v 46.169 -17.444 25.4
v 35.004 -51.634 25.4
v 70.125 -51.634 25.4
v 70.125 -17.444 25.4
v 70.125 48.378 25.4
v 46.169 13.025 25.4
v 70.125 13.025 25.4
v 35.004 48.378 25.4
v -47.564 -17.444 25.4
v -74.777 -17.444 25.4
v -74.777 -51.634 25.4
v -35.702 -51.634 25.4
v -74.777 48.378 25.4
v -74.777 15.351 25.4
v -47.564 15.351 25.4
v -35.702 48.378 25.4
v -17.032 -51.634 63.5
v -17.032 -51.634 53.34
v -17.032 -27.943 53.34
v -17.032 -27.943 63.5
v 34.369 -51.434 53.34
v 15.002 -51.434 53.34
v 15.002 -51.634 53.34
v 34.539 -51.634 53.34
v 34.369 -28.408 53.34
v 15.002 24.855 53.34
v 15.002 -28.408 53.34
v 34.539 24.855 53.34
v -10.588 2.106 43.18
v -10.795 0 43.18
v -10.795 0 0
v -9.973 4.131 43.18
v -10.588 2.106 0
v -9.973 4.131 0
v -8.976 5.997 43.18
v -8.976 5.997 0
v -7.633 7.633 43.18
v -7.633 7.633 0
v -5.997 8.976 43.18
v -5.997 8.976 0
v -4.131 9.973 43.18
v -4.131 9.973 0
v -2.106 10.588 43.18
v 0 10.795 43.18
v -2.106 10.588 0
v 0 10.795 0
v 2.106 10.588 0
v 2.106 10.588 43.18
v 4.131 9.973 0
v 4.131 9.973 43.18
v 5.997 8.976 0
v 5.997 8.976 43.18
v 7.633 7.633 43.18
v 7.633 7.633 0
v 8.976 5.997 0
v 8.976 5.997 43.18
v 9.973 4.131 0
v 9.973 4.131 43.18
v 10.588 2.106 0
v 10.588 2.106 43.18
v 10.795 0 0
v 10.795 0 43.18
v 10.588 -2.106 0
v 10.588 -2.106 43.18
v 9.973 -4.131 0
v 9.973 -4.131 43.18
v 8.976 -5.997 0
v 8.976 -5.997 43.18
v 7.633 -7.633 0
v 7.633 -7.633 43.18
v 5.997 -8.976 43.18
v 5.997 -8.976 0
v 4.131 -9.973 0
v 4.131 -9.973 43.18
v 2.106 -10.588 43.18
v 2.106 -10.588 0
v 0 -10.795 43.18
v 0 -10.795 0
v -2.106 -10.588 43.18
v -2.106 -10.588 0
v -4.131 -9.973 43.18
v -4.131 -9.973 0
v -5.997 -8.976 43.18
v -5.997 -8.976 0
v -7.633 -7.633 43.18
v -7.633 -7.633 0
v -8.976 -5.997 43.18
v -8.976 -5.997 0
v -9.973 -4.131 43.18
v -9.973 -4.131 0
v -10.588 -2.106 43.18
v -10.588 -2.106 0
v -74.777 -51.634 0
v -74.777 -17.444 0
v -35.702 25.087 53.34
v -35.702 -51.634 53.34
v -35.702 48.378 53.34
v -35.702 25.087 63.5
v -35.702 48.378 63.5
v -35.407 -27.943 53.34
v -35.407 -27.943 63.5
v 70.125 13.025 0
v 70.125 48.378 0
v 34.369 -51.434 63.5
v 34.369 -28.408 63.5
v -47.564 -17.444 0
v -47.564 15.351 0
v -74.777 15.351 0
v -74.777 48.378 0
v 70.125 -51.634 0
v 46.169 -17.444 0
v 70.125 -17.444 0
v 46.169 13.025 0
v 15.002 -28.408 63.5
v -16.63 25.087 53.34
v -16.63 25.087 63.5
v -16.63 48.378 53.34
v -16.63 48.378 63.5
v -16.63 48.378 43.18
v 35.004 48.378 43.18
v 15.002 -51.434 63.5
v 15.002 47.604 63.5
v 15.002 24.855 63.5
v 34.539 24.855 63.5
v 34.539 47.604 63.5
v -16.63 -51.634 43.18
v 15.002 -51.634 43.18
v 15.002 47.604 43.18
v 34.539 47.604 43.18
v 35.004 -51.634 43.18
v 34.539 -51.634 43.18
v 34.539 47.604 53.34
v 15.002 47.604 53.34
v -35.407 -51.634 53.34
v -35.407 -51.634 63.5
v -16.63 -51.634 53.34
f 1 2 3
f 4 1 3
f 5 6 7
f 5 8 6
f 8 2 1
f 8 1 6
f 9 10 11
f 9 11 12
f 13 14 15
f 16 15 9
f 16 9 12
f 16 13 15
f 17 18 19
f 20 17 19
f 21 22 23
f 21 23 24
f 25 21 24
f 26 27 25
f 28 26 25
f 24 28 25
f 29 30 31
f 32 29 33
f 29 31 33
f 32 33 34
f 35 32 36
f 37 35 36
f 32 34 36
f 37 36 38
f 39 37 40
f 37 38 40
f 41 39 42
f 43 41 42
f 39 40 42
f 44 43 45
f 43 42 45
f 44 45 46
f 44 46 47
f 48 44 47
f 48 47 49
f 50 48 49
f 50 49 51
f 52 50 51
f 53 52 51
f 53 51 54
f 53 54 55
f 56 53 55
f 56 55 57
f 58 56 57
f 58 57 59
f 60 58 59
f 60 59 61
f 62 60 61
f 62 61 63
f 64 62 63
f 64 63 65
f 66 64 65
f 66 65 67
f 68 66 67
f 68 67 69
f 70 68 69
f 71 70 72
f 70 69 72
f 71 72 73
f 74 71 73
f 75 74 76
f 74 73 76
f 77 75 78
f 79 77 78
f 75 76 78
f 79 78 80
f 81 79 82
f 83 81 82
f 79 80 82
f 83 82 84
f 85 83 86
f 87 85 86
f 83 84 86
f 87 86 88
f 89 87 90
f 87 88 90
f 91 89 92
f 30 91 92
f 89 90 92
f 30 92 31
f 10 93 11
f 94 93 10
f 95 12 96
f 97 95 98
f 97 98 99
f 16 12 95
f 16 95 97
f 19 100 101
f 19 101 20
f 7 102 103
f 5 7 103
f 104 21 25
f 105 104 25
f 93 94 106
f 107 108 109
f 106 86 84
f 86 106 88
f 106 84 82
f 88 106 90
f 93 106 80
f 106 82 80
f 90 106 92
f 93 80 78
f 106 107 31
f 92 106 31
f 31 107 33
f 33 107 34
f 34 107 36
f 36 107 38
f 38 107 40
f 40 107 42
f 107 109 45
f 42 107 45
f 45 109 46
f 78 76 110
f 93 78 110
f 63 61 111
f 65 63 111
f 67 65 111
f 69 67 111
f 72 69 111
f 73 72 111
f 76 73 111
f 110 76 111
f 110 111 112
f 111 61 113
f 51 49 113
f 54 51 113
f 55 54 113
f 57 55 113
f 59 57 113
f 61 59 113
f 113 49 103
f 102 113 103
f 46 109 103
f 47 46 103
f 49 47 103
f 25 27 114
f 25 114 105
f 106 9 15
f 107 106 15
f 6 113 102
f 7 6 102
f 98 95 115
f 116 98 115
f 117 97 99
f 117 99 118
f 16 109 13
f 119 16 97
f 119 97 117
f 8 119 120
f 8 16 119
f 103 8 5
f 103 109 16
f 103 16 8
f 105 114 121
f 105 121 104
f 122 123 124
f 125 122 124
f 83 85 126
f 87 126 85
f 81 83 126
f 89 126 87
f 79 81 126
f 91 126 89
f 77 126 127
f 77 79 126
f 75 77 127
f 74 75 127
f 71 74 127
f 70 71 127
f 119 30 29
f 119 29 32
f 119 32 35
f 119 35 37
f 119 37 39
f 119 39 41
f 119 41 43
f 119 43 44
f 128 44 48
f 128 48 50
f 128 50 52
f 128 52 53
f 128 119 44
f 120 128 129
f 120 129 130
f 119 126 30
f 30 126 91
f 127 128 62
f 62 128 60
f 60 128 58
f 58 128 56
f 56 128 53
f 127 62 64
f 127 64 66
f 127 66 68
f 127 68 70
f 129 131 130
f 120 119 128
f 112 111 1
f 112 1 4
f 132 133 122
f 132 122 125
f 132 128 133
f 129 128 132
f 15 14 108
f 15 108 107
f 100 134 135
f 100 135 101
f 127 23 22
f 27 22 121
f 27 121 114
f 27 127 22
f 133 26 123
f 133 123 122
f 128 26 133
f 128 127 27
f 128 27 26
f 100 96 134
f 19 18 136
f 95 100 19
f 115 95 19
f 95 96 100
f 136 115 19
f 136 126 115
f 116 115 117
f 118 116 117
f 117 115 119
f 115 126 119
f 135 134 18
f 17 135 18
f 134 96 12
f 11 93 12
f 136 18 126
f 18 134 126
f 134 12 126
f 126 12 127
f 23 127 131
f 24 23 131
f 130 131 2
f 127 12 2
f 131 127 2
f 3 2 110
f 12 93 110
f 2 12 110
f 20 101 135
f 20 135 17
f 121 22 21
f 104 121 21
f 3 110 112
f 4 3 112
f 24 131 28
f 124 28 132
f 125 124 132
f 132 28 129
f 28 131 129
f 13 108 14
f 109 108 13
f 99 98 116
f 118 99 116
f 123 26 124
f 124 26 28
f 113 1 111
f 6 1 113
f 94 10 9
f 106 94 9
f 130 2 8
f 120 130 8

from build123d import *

# Parameters (mm, degrees)
F0_W      = 144.9018344283
F0_H      = 100.0124998391
F1_DEPTH  = 25.4
F2_W      = 23.9564813673
F2_H      = 30.4689249024
F3_DEPTH  = 25.4
F4_W      = 27.2127054632
F4_H      = 32.7947968617
F5_DEPTH  = 25.4
F6_W      = 70.706512779
F6_H      = 100.0124998391
F7_DEPTH  = 17.78
F9_W      = 19.5373268798
F9_H      = 99.2384850979
F8_W      = 19.0721508116
F8_H      = 100.0124998391
F10_DEPTH = 10.16
F12_W     = 19.5373268798
F12_H     = 22.7496176958
F11_W     = 19.0721508116
F11_H     = 23.2910439372
F15_DEPTH = 10.16
F13_W     = 18.3743890375
F13_H     = 23.6915722489
F14_W     = 19.367502071
F14_H     = 23.0261366814
F16_DEPTH = 10.16
F19_D     = 21.59


with BuildPart() as f1:
    # F0 (on Top) → F1 (new body)
    with BuildSketch(Plane.XY):
        with Locations((-2.325873822, -1.6281101853)):
            Rectangle(F0_W, F0_H)
    extrude(amount=F1_DEPTH)

    # F2 (on face) → F3 (cut)
    with BuildSketch(Plane.XY.offset(25.4)):
        with Locations((58.1468027085, -2.2095781751)):
            Rectangle(F2_W, F2_H)
    extrude(amount=-F3_DEPTH, mode=Mode.SUBTRACT)

    # F4 (on face) → F5 (cut)
    with BuildSketch(Plane.XY.offset(25.4)):
        with Locations((-61.1704383045, -1.0466421954)):
            Rectangle(F4_W, F4_H)
    extrude(amount=-F5_DEPTH, mode=Mode.SUBTRACT)

    # F6 (on face) → F7 (join)
    with BuildSketch(Plane.XY.offset(25.4)):
        with Locations((-0.3488790244, -1.6281101853)):
            Rectangle(F6_W, F6_H)
    extrude(amount=F7_DEPTH)

    # F9 (on face) + F8 (on face) → F10 (join)
    with BuildSketch(Plane.XY.offset(43.18)):
        with Locations((24.7705369256, -2.0151175559)):
            Rectangle(F9_W, F9_H)
    with BuildSketch(Plane.XY.offset(43.18)):
        with Locations((-26.1660600081, -1.6281101853)):
            Rectangle(F8_W, F8_H)
    extrude(amount=F10_DEPTH)

    # F12 (on face) + F11 (on face) → F15 (join)
    with BuildSketch(Plane.XY.offset(53.34)):
        with Locations((24.7705369256, 36.2293161452)):
            Rectangle(F12_W, F12_H)
    with BuildSketch(Plane.XY.offset(53.34)):
        with Locations((-26.1660600081, 36.7326177657)):
            Rectangle(F11_W, F11_H)
    extrude(amount=F15_DEPTH)

    # F13 (on face) + F14 (on face) → F16 (join)
    with BuildSketch(Plane.XY.offset(53.34)):
        with Locations((-26.2195924297, -39.7885739803)):
            Rectangle(F13_W, F13_H)
    with BuildSketch(Plane.XY.offset(53.34)):
        with Locations((24.6856245212, -39.9210313335)):
            Rectangle(F14_W, F14_H)
    extrude(amount=F16_DEPTH)

    # F19 (through all)
    with Locations(Plane.XY.offset(43.18)):
        with Locations((0, 0)):
            Hole(F19_D / 2)


solid = f1.part
